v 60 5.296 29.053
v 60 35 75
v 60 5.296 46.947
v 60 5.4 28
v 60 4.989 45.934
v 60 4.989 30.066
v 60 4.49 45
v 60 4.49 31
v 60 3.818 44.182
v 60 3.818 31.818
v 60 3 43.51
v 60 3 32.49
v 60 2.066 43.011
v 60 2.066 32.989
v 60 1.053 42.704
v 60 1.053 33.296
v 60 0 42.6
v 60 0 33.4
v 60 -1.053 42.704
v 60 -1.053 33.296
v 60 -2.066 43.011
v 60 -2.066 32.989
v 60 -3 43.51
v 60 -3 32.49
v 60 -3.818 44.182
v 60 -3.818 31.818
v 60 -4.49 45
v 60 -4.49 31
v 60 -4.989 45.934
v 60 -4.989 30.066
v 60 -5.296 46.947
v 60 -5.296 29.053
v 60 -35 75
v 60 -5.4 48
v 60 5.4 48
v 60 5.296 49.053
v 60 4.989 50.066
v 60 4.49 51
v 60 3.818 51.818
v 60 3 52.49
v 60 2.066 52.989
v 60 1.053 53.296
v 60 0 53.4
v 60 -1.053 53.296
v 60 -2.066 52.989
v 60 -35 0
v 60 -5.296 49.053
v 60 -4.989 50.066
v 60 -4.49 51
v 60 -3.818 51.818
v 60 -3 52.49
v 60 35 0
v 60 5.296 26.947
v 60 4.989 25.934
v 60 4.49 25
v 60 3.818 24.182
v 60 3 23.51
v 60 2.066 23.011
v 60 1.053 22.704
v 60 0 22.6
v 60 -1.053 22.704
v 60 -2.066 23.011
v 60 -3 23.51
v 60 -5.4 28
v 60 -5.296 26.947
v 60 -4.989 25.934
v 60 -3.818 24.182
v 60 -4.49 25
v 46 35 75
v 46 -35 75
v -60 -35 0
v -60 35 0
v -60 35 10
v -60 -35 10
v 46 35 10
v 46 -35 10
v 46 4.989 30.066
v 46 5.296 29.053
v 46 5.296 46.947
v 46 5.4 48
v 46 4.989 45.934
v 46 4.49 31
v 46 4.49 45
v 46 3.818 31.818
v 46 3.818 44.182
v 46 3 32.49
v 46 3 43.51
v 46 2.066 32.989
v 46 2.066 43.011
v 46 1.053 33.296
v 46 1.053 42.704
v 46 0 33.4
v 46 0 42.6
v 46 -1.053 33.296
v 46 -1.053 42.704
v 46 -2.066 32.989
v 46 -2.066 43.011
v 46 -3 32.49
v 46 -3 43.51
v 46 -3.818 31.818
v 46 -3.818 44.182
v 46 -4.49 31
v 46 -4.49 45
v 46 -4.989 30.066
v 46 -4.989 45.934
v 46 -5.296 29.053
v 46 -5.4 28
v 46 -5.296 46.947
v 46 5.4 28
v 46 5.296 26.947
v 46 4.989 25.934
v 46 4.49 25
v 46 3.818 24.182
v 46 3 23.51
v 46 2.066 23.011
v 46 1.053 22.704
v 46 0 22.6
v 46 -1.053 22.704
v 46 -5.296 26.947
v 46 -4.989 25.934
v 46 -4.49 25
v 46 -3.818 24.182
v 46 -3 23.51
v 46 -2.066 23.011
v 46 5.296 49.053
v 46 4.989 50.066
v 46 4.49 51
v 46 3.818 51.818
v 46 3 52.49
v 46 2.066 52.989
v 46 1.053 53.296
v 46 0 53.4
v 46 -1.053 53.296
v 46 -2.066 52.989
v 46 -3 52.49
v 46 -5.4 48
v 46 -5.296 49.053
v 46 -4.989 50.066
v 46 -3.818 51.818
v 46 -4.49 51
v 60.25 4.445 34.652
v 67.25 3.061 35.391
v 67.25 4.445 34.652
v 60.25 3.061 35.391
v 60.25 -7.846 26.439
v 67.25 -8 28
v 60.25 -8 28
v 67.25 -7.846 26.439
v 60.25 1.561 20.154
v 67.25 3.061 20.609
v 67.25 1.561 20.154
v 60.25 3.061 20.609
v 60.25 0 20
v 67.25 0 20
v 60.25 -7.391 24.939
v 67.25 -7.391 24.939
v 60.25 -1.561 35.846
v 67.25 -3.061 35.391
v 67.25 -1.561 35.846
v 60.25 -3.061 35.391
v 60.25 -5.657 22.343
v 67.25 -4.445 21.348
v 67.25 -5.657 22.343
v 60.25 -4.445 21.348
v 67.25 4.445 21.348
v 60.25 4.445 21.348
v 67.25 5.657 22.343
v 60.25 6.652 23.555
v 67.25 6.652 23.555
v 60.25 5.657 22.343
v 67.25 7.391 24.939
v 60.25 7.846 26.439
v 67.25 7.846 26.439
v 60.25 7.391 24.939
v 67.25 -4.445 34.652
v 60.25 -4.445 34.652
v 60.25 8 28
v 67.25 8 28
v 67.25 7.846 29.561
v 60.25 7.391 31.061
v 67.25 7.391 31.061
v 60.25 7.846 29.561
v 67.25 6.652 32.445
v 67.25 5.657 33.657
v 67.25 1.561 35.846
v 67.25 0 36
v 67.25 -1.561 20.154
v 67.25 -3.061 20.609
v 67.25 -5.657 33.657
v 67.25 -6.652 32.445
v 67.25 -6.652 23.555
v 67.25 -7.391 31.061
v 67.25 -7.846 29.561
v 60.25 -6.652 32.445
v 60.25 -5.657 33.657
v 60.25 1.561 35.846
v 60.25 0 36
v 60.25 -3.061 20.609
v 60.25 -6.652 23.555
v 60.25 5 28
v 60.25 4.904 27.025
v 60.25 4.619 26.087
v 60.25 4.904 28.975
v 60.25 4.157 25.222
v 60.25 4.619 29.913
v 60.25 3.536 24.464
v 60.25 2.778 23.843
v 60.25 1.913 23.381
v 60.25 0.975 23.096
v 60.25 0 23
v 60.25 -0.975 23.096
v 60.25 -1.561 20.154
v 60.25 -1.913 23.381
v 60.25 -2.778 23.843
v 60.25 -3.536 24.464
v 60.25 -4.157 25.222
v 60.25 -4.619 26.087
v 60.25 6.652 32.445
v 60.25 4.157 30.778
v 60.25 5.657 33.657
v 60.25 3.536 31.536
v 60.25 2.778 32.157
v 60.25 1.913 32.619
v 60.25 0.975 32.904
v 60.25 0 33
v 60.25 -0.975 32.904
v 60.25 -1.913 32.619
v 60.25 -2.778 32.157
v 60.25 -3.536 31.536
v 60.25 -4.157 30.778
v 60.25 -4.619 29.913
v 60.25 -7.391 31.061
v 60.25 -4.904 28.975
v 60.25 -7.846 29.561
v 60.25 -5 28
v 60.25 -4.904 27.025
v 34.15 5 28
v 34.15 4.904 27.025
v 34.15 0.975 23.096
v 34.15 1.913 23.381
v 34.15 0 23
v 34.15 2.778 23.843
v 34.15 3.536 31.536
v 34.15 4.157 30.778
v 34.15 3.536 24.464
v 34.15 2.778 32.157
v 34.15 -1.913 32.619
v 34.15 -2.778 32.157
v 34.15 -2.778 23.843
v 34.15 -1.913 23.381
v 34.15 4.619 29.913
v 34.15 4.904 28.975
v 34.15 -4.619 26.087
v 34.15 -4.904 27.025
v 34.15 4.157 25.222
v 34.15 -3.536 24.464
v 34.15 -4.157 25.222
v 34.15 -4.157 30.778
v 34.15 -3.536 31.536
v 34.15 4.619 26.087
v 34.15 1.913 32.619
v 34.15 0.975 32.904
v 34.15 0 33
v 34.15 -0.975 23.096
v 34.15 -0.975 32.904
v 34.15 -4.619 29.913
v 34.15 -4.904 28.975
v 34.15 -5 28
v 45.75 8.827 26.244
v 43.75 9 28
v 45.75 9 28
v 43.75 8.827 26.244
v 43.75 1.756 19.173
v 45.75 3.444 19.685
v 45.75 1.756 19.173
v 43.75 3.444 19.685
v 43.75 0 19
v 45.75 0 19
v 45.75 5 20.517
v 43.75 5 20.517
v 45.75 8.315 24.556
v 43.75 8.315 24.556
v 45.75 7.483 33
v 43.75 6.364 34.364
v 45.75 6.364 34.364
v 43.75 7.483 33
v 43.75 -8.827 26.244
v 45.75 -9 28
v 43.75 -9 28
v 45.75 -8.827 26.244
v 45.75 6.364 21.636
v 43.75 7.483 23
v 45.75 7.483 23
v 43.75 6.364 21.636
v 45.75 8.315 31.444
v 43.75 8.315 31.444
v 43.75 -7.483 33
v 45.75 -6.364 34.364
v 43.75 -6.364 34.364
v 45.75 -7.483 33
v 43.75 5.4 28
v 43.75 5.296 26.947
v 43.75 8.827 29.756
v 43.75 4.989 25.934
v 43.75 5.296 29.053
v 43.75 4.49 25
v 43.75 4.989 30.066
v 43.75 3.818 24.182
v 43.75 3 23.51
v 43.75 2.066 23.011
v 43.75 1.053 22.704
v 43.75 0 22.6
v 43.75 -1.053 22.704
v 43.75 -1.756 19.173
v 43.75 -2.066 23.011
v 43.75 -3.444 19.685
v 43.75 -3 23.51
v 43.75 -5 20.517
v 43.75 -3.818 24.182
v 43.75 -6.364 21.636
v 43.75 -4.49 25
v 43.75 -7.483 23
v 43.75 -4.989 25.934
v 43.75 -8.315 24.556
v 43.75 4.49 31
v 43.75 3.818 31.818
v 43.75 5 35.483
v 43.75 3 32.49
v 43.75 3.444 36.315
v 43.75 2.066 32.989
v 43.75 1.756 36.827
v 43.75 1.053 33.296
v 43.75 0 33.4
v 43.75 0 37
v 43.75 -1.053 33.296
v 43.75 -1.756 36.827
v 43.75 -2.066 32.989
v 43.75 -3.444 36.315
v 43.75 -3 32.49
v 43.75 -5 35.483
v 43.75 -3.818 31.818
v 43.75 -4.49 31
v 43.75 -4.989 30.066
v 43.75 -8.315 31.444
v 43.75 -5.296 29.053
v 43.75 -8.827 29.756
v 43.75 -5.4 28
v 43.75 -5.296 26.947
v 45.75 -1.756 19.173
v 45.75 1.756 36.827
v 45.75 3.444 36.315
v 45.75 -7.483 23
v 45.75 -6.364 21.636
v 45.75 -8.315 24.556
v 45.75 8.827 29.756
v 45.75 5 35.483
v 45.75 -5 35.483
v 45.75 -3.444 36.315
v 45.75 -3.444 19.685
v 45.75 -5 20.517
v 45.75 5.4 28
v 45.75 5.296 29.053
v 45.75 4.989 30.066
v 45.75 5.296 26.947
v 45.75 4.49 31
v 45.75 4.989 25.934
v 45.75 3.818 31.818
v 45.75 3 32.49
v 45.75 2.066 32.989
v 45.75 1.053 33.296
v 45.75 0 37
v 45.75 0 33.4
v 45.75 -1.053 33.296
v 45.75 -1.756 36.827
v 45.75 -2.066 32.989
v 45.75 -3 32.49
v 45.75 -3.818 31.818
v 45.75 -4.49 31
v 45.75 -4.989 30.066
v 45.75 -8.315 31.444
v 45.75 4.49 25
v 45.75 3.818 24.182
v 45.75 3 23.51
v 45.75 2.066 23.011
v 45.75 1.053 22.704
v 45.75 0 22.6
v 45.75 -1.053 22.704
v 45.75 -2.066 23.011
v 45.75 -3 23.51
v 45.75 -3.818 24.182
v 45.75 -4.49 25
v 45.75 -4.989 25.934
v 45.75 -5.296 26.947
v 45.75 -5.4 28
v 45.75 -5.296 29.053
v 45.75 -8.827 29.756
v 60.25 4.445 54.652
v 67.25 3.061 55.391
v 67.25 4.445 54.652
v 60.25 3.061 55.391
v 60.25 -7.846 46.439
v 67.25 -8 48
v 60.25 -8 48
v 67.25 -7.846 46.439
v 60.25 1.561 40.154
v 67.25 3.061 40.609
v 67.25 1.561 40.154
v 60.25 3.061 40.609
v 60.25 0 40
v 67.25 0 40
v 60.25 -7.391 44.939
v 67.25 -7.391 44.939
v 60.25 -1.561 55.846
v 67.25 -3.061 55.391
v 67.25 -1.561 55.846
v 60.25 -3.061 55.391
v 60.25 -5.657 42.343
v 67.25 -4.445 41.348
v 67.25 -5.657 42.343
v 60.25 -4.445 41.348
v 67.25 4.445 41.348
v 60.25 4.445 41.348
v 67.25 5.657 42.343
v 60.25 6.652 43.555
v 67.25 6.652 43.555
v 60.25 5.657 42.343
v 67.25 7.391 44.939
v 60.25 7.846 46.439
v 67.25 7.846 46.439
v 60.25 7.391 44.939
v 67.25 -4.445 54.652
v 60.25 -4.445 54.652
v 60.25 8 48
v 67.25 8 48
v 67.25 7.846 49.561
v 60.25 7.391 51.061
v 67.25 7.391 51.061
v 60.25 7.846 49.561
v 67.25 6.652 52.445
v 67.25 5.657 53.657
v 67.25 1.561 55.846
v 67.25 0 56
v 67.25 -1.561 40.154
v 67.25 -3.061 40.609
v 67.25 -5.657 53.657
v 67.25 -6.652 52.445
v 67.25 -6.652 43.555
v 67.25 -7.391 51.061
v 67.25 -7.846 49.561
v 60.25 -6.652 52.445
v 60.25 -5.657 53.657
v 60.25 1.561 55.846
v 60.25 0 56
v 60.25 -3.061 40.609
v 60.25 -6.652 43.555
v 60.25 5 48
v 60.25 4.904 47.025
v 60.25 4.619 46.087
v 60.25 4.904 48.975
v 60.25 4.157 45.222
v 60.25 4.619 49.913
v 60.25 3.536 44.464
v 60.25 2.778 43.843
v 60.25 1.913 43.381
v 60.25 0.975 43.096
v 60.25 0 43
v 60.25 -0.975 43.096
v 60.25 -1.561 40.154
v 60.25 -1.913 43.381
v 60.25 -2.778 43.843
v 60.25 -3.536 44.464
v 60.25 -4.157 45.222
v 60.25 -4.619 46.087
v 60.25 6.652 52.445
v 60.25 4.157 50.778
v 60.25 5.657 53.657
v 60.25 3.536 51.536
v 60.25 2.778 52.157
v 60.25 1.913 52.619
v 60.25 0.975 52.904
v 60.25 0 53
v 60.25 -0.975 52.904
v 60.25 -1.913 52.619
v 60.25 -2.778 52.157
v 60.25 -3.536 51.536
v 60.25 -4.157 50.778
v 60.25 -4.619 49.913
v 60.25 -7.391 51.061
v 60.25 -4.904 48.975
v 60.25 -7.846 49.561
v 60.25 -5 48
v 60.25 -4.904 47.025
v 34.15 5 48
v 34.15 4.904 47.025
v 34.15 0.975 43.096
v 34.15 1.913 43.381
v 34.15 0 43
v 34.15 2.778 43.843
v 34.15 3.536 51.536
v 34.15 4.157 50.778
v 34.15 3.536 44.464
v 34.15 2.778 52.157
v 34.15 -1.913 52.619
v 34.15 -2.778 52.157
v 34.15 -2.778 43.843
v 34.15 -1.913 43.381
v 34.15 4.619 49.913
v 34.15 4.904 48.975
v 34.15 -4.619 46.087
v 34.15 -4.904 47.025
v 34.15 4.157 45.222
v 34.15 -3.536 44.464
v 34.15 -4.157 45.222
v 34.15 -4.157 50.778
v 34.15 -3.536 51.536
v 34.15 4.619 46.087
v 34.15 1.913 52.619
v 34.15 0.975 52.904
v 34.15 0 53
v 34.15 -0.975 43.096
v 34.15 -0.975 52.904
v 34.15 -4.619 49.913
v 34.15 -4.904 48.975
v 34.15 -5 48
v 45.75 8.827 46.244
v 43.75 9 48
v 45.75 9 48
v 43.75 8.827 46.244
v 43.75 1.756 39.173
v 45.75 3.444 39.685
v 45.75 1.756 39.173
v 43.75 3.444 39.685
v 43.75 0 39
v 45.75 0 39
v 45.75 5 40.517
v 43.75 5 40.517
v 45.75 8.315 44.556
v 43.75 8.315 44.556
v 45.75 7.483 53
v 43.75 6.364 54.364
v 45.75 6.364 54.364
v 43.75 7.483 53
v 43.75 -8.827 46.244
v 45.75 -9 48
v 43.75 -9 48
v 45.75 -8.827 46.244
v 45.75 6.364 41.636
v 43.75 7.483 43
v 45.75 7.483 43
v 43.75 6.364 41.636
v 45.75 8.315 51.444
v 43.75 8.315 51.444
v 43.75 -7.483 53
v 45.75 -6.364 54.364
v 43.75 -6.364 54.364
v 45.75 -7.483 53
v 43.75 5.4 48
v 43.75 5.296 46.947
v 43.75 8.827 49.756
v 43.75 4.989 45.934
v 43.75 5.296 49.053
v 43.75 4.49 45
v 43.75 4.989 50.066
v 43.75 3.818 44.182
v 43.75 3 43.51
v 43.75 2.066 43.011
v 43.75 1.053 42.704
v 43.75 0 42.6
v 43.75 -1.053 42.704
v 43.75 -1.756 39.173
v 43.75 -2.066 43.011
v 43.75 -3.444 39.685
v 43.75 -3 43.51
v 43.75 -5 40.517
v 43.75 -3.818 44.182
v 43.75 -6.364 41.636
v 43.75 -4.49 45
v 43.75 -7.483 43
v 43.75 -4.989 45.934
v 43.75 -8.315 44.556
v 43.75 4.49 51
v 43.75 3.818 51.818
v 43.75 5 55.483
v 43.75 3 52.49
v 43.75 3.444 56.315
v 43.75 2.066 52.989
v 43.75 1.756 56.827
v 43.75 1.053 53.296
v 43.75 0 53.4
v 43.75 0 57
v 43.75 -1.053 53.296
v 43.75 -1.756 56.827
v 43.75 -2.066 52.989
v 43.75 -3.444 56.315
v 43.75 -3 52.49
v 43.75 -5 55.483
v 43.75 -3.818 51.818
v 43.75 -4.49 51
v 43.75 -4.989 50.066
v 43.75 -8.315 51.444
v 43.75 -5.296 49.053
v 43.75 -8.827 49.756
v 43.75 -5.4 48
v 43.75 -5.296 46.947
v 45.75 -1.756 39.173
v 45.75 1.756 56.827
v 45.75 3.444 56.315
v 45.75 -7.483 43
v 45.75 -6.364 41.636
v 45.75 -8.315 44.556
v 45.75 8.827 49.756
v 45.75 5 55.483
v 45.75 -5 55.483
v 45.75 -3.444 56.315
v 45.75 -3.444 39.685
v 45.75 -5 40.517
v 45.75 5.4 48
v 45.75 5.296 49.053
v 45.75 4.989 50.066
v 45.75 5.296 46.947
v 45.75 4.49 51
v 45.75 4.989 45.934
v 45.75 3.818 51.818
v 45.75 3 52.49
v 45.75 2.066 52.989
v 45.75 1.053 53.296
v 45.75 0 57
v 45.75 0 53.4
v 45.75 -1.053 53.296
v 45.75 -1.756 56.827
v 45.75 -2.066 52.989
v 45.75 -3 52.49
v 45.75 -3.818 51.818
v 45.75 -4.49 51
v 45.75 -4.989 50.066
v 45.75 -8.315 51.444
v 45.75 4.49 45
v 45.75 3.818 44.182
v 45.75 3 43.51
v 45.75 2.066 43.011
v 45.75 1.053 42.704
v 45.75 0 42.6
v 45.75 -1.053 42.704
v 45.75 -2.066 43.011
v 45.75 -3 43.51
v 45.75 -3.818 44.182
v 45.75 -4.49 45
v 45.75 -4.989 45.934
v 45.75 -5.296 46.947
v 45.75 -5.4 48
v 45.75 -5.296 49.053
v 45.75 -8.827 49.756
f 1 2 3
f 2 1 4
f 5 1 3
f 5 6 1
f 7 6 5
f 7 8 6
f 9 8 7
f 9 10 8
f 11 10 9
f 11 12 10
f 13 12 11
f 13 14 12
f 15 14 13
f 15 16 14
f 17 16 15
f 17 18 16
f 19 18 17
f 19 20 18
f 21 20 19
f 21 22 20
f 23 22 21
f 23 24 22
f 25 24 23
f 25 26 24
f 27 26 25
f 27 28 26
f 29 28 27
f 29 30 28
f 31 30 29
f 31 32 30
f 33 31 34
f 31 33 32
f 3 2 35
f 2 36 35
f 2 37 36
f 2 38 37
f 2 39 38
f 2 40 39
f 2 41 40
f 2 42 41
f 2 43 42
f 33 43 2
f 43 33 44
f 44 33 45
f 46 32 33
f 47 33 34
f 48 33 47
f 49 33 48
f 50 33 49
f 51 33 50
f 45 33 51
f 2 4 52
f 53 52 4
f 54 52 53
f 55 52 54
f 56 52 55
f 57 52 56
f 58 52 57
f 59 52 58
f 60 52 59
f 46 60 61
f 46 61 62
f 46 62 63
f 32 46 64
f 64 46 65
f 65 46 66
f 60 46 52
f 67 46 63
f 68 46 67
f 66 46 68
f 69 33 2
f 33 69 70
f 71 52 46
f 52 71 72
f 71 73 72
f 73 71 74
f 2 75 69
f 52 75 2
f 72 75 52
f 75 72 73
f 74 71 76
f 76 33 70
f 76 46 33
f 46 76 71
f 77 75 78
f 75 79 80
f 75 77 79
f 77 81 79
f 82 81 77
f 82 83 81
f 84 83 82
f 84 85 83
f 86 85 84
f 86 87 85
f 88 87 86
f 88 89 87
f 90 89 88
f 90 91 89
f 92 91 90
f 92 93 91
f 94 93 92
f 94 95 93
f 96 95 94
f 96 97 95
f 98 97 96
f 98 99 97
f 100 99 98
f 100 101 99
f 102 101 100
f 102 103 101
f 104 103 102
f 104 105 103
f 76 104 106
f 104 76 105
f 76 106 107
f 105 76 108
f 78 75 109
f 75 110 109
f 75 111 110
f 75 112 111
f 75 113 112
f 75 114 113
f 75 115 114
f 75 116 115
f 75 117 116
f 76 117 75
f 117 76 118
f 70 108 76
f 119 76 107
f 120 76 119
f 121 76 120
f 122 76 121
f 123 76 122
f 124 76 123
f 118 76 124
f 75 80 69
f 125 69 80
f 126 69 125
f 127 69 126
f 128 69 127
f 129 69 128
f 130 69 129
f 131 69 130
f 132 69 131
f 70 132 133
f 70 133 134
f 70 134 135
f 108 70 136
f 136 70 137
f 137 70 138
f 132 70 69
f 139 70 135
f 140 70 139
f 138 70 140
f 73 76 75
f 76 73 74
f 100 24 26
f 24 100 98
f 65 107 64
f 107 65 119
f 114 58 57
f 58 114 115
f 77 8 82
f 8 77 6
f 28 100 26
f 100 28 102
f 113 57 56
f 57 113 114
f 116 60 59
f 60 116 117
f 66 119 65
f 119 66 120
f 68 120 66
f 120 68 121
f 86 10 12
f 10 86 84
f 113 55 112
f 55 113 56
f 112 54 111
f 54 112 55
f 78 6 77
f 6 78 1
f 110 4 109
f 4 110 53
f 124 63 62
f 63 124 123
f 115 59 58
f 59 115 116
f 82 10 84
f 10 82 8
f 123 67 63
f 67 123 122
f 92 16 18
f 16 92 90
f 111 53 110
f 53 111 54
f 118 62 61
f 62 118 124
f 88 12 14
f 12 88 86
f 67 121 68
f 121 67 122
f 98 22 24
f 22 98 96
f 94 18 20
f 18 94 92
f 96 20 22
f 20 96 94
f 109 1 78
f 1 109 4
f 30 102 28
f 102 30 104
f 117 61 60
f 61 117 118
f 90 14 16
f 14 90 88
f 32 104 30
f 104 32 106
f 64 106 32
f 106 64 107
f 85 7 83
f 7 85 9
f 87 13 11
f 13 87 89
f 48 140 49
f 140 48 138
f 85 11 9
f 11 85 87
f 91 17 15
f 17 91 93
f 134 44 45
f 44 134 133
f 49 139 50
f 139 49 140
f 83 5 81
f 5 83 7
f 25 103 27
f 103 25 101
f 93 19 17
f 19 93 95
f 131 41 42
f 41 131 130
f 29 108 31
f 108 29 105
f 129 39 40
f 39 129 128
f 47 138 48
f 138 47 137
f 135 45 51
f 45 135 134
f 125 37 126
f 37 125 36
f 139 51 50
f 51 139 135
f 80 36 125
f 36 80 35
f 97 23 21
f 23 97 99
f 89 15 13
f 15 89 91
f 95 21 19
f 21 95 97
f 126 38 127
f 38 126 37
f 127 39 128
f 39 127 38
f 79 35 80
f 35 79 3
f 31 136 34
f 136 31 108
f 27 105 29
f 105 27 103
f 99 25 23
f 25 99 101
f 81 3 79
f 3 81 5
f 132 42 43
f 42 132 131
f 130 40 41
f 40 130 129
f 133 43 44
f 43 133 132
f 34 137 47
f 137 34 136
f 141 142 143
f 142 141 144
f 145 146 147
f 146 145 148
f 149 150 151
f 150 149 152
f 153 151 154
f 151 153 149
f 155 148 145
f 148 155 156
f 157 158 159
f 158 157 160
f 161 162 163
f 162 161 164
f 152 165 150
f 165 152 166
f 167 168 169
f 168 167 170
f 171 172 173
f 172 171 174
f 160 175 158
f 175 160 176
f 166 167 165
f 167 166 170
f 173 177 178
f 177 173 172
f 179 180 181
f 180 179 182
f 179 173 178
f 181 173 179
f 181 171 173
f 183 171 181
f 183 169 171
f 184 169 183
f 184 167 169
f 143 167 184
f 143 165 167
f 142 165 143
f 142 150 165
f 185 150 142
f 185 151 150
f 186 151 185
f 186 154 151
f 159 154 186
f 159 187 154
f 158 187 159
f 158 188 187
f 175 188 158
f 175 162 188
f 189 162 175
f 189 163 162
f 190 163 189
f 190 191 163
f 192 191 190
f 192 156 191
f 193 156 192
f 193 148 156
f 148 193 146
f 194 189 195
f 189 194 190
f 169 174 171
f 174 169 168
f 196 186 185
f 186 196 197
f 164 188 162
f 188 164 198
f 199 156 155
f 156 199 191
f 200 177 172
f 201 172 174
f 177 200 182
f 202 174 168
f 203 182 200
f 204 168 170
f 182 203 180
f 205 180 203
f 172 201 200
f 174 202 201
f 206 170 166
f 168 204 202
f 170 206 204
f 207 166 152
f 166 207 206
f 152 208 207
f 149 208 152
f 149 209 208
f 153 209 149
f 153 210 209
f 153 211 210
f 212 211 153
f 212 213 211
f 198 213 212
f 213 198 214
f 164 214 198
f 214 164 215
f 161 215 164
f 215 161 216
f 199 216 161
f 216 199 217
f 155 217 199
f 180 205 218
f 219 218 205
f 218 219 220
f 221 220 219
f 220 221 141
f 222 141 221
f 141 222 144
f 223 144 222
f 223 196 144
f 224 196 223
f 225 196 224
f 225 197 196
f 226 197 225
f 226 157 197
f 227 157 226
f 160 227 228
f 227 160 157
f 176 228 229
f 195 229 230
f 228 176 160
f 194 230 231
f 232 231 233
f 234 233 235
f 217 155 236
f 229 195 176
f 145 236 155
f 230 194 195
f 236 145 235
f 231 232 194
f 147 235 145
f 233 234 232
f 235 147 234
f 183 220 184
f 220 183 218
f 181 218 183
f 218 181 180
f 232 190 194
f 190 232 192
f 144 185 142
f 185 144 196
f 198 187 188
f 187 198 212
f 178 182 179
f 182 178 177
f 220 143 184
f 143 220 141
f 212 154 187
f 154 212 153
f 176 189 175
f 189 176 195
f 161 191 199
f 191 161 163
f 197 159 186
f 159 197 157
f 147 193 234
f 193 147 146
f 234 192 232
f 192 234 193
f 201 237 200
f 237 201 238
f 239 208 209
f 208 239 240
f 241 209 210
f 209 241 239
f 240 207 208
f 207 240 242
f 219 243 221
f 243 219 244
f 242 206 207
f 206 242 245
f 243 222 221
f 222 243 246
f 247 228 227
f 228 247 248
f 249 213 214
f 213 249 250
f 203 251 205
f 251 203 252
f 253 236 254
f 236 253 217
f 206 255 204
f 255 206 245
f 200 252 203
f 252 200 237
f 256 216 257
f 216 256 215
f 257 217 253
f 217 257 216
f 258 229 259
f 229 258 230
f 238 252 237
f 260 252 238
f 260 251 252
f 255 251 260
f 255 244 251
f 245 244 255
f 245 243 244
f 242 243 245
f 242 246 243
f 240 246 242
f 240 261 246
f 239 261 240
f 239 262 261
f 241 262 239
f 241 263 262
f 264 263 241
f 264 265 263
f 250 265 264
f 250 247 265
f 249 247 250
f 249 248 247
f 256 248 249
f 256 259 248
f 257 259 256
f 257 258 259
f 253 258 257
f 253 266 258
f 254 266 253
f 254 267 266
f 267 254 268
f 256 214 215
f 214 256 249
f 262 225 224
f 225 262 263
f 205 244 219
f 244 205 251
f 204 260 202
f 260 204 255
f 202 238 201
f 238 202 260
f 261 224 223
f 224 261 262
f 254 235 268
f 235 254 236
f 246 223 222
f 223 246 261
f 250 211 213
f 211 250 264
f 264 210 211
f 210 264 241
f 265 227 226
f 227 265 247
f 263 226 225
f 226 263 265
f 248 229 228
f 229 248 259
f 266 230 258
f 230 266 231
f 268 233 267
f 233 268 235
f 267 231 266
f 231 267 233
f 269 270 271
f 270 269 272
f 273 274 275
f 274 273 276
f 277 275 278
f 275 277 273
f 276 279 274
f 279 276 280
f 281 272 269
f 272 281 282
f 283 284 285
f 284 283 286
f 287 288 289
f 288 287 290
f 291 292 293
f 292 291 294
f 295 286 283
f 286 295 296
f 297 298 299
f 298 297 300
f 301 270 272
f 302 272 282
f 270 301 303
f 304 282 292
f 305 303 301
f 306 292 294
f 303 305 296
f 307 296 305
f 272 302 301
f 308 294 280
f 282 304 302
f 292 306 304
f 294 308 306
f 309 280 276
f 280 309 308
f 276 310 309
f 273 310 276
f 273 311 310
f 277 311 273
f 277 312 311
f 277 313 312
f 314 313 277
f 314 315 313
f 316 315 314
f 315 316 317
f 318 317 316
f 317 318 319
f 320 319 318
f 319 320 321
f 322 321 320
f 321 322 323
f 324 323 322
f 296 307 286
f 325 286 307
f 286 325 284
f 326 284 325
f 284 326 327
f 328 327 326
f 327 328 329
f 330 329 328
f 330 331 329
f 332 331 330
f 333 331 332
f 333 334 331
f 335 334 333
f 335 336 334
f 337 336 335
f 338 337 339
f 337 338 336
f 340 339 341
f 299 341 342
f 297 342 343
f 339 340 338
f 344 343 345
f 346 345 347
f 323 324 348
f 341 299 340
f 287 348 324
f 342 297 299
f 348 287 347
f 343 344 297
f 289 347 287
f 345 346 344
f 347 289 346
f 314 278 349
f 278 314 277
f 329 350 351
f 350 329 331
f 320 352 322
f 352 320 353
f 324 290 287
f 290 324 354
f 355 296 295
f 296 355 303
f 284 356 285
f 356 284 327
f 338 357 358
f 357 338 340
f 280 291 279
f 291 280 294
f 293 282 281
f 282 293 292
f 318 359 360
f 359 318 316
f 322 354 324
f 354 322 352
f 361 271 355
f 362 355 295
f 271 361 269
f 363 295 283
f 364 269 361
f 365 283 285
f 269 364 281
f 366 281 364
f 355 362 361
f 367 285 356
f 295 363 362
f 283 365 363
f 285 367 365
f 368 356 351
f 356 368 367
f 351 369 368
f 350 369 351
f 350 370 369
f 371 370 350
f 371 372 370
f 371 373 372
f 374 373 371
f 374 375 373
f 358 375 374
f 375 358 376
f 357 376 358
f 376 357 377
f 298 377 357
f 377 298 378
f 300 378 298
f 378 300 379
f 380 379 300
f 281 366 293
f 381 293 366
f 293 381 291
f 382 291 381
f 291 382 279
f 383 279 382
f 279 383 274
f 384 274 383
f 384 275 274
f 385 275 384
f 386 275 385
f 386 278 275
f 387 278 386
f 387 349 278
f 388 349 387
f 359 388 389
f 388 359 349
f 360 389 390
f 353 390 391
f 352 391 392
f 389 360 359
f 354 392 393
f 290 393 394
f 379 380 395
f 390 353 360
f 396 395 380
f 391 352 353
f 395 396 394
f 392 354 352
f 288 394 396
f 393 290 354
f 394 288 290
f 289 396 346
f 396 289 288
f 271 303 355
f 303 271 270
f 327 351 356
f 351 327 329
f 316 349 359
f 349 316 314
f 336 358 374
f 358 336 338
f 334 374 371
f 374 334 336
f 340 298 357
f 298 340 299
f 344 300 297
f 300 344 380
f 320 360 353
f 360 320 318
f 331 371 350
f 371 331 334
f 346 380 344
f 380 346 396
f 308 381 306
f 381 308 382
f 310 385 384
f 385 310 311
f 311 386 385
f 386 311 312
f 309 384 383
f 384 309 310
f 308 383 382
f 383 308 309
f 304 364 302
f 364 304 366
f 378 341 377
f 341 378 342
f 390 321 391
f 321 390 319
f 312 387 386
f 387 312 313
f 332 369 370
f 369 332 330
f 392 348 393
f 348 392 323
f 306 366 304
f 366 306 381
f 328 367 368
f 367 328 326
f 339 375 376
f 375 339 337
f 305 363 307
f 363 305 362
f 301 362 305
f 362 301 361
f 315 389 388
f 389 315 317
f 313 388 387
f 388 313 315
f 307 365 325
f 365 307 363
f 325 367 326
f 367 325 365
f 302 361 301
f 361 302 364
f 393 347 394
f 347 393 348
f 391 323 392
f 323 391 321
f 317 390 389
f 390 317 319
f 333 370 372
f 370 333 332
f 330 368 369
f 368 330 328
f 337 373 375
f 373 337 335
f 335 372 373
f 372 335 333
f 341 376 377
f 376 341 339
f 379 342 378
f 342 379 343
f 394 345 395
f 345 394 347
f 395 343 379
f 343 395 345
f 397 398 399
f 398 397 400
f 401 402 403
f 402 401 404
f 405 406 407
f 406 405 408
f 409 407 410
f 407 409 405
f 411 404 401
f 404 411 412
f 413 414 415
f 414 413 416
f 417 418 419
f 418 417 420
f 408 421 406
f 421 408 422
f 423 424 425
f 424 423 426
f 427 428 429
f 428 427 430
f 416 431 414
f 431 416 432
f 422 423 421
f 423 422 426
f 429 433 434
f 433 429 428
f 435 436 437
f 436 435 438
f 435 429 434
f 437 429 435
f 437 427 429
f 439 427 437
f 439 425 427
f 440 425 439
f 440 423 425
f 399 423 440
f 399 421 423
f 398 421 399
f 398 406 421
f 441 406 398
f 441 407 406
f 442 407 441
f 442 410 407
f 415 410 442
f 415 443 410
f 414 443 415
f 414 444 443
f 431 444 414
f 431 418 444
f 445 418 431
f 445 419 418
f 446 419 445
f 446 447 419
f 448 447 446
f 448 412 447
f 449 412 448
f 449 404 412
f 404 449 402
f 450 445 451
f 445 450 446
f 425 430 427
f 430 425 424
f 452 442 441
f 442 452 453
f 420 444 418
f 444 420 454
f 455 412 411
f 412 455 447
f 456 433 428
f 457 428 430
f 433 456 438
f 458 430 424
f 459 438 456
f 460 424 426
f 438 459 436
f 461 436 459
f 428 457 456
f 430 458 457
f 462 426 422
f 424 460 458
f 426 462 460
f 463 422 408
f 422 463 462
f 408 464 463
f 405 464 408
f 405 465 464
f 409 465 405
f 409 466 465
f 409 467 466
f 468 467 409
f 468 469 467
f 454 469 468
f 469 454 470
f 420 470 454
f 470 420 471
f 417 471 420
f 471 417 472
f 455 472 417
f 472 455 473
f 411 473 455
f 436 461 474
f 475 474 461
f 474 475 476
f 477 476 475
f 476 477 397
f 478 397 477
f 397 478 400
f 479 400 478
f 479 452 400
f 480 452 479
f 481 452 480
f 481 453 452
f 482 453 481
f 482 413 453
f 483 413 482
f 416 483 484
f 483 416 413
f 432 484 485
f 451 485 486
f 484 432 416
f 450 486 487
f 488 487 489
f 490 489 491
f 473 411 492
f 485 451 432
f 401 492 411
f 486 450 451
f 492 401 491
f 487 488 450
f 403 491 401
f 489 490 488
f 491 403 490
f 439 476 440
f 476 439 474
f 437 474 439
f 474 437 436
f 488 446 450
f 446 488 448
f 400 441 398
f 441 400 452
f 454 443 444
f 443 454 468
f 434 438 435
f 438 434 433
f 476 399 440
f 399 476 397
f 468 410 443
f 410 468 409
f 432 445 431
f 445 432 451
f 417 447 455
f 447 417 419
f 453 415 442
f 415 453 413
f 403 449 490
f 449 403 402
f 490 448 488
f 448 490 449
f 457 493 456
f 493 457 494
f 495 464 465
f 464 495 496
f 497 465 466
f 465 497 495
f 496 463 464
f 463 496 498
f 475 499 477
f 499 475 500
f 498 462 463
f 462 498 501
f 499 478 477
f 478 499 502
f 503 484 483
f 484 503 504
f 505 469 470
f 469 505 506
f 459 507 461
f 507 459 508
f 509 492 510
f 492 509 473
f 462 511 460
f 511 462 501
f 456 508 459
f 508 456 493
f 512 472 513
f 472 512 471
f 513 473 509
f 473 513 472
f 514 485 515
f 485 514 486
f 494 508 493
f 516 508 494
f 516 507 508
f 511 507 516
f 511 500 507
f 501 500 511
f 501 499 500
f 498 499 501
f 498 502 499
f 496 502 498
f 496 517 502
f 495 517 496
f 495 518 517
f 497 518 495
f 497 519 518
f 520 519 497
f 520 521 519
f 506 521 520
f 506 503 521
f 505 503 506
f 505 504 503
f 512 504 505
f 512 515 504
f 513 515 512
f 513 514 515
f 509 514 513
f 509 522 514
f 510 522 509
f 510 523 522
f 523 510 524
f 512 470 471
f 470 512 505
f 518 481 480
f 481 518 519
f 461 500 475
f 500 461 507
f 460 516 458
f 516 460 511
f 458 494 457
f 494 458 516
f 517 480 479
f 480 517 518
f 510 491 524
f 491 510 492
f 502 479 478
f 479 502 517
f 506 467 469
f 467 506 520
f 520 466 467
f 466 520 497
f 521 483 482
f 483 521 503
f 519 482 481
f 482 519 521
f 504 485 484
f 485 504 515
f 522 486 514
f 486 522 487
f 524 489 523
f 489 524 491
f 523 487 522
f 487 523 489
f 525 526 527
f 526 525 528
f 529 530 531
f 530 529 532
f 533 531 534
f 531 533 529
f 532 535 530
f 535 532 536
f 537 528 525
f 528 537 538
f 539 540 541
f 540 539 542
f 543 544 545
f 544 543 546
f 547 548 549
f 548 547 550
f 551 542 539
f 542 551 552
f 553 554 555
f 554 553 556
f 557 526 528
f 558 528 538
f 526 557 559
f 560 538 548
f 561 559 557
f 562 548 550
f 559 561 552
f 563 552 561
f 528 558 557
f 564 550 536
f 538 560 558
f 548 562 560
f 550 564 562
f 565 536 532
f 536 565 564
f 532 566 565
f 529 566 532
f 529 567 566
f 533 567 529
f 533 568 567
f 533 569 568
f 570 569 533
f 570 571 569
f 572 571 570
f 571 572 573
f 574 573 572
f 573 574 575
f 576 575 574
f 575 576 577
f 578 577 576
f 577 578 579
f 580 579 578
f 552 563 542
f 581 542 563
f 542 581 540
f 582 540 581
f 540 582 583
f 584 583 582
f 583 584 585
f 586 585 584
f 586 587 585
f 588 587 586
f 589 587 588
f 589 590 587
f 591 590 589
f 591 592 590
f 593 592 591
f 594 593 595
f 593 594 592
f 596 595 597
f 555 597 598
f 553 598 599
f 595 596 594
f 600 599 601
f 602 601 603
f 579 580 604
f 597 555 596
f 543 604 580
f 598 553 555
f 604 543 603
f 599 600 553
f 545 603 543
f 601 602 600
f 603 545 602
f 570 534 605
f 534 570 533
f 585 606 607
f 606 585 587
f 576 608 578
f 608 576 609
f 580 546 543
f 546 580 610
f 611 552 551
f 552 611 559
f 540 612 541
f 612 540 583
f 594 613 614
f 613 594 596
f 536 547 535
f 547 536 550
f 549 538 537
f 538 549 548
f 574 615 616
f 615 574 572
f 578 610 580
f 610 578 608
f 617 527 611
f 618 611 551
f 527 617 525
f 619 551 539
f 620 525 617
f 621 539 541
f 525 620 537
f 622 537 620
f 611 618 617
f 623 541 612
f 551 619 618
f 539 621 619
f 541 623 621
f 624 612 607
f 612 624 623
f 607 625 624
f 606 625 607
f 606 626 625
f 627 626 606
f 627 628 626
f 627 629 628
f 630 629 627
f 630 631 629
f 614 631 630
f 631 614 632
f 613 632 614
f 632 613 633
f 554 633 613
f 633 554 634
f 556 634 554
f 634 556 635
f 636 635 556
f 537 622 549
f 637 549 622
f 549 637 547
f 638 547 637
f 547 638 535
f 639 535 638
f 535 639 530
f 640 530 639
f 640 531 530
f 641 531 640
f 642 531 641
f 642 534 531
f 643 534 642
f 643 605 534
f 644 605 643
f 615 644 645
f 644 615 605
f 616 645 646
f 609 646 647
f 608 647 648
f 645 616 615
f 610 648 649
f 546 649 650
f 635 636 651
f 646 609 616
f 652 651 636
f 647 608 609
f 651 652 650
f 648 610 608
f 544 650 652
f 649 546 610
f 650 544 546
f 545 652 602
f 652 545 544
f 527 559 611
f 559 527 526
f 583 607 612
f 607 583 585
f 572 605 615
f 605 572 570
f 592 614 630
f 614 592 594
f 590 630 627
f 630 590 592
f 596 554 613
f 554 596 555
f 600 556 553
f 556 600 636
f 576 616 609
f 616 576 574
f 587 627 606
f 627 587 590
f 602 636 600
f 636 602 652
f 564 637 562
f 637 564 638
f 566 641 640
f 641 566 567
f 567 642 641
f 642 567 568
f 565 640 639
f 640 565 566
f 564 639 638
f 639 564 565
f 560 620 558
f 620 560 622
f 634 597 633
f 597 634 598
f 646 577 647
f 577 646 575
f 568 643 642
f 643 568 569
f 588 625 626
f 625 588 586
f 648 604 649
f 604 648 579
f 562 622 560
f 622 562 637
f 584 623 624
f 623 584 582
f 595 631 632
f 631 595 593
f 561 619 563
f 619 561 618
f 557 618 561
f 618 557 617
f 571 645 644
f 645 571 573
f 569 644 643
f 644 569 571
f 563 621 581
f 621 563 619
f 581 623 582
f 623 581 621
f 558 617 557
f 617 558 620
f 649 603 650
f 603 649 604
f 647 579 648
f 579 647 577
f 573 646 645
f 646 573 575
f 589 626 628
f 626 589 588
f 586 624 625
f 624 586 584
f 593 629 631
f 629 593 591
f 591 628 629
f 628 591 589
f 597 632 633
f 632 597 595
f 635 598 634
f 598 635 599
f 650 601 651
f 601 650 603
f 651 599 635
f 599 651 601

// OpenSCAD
$fn = 32;

// ------------------------------------------------------------------------
// Bolted bracket: 120 x 70 mm bracket with 2 bolt joints
// Every part is its own module, assembly() places them once.
// ------------------------------------------------------------------------

// --- part 1 ---
module bracket() {
  difference() {
    translate([-60, -35, 0]) cube([120, 70, 75]);
    translate([-61, -36, 10]) cube([107, 72, 66]);
    translate([53, 0, 28]) rotate([0, 90, 0]) cylinder(h = 16, d = 10.8, center = true);
    translate([53, 0, 48]) rotate([0, 90, 0]) cylinder(h = 16, d = 10.8, center = true);
  }
}

// --- part 2 ---
module bolt1() {
  cylinder(h = 7, d = 16);
  translate([0, 0, -26.1]) cylinder(h = 26.1, d = 10);
}

// --- part 3 ---
module washer1() {
  difference() {
      translate([0, 0, 0]) cylinder(h = 2, d = 18);
      translate([0, 0, -1]) cylinder(h = 4, d = 10.8);
    }
}

// --- part 4 ---
module bolt2() {
  cylinder(h = 7, d = 16);
  translate([0, 0, -26.1]) cylinder(h = 26.1, d = 10);
}

// --- part 5 ---
module washer2() {
  difference() {
      translate([0, 0, 0]) cylinder(h = 2, d = 18);
      translate([0, 0, -1]) cylinder(h = 4, d = 10.8);
    }
}

// --- assembly ---
module assembly() {
  translate([0, 0, 0]) rotate([0, 0, 0]) bracket();
  translate([60.25, 0, 28]) rotate([0, 90, 0]) bolt1();
  translate([43.75, 0, 28]) rotate([0, 90, 0]) washer1();
  translate([60.25, 0, 48]) rotate([0, 90, 0]) bolt2();
  translate([43.75, 0, 48]) rotate([0, 90, 0]) washer2();
}

assembly();
